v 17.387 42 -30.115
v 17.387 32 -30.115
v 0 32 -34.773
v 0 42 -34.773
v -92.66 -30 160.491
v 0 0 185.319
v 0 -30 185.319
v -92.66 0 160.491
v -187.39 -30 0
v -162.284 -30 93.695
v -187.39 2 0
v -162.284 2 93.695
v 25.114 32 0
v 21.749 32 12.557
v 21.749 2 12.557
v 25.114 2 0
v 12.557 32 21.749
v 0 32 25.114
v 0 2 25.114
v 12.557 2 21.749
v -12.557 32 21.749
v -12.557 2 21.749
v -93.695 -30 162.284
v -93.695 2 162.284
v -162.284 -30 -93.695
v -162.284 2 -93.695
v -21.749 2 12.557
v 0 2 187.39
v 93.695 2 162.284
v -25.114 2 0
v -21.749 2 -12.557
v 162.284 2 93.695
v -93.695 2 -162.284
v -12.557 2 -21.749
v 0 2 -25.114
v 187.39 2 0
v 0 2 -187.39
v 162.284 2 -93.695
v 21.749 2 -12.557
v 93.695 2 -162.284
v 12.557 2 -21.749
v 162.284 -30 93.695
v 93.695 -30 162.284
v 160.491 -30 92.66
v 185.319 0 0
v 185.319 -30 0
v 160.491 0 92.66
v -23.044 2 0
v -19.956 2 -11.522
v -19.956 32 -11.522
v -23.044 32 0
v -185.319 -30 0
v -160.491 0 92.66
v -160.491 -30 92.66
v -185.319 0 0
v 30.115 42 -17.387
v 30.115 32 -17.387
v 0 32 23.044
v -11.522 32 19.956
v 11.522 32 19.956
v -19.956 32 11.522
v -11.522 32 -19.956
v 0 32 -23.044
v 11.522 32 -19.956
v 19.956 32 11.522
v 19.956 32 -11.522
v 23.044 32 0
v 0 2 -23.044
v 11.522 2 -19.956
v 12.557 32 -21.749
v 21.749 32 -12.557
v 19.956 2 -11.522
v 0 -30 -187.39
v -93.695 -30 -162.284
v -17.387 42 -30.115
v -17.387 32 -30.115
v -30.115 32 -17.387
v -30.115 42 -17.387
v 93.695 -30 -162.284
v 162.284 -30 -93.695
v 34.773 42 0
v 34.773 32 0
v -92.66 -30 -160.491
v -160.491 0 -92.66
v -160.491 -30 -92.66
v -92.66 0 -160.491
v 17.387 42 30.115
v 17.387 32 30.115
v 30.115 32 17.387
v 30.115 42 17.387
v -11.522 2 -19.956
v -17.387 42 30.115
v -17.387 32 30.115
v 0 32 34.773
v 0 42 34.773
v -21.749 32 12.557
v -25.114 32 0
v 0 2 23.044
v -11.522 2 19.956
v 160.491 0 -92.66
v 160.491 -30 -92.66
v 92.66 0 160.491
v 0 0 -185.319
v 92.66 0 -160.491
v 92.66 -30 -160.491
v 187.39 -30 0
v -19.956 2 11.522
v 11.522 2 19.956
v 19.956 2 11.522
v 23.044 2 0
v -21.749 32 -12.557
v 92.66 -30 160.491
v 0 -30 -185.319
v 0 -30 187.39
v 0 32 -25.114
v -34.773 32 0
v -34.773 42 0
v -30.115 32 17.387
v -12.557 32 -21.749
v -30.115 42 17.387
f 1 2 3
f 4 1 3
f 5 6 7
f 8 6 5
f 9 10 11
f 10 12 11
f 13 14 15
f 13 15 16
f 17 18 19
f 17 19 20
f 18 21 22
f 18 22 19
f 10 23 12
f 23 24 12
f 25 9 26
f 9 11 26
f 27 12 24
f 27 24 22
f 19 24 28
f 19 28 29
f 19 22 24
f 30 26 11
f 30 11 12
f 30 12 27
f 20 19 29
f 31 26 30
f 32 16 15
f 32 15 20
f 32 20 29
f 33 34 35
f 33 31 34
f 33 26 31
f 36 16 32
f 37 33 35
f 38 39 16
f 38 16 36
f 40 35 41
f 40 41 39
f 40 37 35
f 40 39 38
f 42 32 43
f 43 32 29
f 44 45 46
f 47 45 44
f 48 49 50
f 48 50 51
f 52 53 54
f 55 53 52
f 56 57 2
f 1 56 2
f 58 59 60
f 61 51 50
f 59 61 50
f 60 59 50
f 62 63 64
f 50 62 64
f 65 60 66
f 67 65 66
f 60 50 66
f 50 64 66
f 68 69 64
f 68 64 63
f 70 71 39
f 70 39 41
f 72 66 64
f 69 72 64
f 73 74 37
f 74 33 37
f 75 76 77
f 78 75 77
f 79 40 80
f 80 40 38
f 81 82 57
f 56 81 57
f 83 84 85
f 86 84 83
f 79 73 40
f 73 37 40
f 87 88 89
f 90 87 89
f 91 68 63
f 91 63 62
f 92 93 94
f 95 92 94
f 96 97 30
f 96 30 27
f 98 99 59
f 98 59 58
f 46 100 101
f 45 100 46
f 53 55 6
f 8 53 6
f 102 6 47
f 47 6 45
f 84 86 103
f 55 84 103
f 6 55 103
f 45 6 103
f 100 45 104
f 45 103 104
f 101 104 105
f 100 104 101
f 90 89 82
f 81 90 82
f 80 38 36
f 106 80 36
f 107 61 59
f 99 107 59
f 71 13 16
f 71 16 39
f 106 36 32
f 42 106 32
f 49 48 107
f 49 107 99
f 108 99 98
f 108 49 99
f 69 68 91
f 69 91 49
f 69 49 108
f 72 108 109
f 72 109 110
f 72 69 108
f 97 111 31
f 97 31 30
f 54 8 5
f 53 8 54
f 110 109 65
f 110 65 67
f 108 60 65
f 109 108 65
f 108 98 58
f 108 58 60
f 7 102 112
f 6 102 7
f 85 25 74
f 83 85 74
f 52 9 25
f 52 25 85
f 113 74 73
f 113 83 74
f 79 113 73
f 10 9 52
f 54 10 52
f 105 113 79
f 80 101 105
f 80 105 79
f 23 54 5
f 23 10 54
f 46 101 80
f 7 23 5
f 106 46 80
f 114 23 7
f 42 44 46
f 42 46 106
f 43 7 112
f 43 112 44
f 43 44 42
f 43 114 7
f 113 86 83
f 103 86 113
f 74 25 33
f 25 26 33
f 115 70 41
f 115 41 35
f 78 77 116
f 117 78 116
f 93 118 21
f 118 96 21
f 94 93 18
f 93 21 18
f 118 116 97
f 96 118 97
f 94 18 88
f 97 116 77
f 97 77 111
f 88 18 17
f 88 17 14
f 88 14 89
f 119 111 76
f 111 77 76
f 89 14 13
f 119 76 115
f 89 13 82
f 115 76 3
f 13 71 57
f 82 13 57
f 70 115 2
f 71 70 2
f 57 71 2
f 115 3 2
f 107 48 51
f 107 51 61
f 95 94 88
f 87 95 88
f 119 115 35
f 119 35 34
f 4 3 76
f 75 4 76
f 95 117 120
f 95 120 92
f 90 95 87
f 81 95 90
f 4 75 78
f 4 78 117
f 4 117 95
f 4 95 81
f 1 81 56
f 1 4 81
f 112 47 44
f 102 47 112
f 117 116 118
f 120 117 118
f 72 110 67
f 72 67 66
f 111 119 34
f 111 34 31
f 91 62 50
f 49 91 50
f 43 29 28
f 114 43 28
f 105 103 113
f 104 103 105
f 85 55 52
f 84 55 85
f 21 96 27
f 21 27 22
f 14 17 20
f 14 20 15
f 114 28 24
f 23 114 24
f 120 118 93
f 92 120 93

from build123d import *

# Parameters (mm, degrees)
BOSS_EXTRUDE1_DEPTH = 2
BOSS_EXTRUDE2_DEPTH = 30
BOSS_EXTRUDE3_DEPTH = 30
BOSS_EXTRUDE4_DEPTH = 30
BOSS_EXTRUDE5_DEPTH = 10


with BuildPart() as part:
    # Sketch1 → Boss-Extrude1 (new body)
    with BuildSketch(Plane(origin=(0, 0, 0), x_dir=(1, 0, 0), z_dir=(0, 1, 0))):
        Polygon((0, 187.3896103), (-93.69480515, 162.284162925), (-162.284162925, 93.69480515), (-187.3896103, 0), (-162.284162925, -93.69480515), (-93.69480515, -162.284162925), (0, -187.3896103), (93.69480515, -162.284162925), (162.284162925, -93.69480515), (187.3896103, 0), (162.284162925, 93.69480515), (93.69480515, 162.284162925), align=None)
    extrude(amount=BOSS_EXTRUDE1_DEPTH)

    # Sketch2 → Boss-Extrude2 (add)
    with BuildSketch(Plane.XZ):
        Polygon((0, 187.3896103), (-93.69480515, 162.284162925), (-162.284162925, 93.69480515), (-187.3896103, 0), (-162.284162925, -93.69480515), (-93.69480515, -162.284162925), (0, -187.3896103), (93.69480515, -162.284162925), (162.284162925, -93.69480515), (187.3896103, 0), (162.284162925, 93.69480515), (93.69480515, 162.284162925), align=None)
        Polygon((0, 185.319057939), (-92.65952897, 160.491011981), (-160.491011981, 92.65952897), (-185.319057939, 0), (-160.491011981, -92.65952897), (-92.65952897, -160.491011981), (0, -185.319057939), (92.65952897, -160.491011981), (160.491011981, -92.65952897), (185.319057939, 0), (160.491011981, 92.65952897), (92.65952897, 160.491011981), align=None, mode=Mode.SUBTRACT)
    extrude(amount=BOSS_EXTRUDE2_DEPTH)

    # Sketch3 → Boss-Extrude3 (add)
    with BuildSketch(Plane(origin=(0, 2, 0), x_dir=(1, 0, 0), z_dir=(0, 1, 0))):
        Polygon((0, 25.114071484), (-12.557035742, 21.749423897), (-21.749423897, 12.557035742), (-25.114071484, 0), (-21.749423897, -12.557035742), (-12.557035742, -21.749423897), (0, -25.114071484), (12.557035742, -21.749423897), (21.749423897, -12.557035742), (25.114071484, 0), (21.749423897, 12.557035742), (12.557035742, 21.749423897), align=None)
        Polygon((0, 23.043519123), (-11.521759561, 19.956272953), (-19.956272953, 11.521759561), (-23.043519123, 0), (-19.956272953, -11.521759561), (-11.521759561, -19.956272953), (0, -23.043519123), (11.521759561, -19.956272953), (19.956272953, -11.521759561), (23.043519123, 0), (19.956272953, 11.521759561), (11.521759561, 19.956272953), align=None, mode=Mode.SUBTRACT)
    extrude(amount=BOSS_EXTRUDE3_DEPTH)

    # Sketch3<2> → Boss-Extrude4 (add)
    with BuildSketch(Plane(origin=(0, 2, 0), x_dir=(1, 0, 0), z_dir=(0, 1, 0))):
        Polygon((0, 25.114071484), (-12.557035742, 21.749423897), (-21.749423897, 12.557035742), (-25.114071484, 0), (-21.749423897, -12.557035742), (-12.557035742, -21.749423897), (0, -25.114071484), (12.557035742, -21.749423897), (21.749423897, -12.557035742), (25.114071484, 0), (21.749423897, 12.557035742), (12.557035742, 21.749423897), align=None)
        Polygon((0, 23.043519123), (-11.521759561, 19.956272953), (-19.956272953, 11.521759561), (-23.043519123, 0), (-19.956272953, -11.521759561), (-11.521759561, -19.956272953), (0, -23.043519123), (11.521759561, -19.956272953), (19.956272953, -11.521759561), (23.043519123, 0), (19.956272953, 11.521759561), (11.521759561, 19.956272953), align=None, mode=Mode.SUBTRACT)
    extrude(amount=BOSS_EXTRUDE4_DEPTH)

    # Sketch5 → Boss-Extrude5 (add)
    with BuildSketch(Plane(origin=(0, 32, 0), x_dir=(1, 0, 0), z_dir=(0, 1, 0))):
        Polygon((0, 34.773329746), (-17.386664873, 30.114586935), (-30.114586935, 17.386664873), (-34.773329746, 0), (-30.114586935, -17.386664873), (-17.386664873, -30.114586935), (0, -34.773329746), (17.386664873, -30.114586935), (30.114586935, -17.386664873), (34.773329746, 0), (30.114586935, 17.386664873), (17.386664873, 30.114586935), align=None)
    extrude(amount=BOSS_EXTRUDE5_DEPTH)


solid = part.part
